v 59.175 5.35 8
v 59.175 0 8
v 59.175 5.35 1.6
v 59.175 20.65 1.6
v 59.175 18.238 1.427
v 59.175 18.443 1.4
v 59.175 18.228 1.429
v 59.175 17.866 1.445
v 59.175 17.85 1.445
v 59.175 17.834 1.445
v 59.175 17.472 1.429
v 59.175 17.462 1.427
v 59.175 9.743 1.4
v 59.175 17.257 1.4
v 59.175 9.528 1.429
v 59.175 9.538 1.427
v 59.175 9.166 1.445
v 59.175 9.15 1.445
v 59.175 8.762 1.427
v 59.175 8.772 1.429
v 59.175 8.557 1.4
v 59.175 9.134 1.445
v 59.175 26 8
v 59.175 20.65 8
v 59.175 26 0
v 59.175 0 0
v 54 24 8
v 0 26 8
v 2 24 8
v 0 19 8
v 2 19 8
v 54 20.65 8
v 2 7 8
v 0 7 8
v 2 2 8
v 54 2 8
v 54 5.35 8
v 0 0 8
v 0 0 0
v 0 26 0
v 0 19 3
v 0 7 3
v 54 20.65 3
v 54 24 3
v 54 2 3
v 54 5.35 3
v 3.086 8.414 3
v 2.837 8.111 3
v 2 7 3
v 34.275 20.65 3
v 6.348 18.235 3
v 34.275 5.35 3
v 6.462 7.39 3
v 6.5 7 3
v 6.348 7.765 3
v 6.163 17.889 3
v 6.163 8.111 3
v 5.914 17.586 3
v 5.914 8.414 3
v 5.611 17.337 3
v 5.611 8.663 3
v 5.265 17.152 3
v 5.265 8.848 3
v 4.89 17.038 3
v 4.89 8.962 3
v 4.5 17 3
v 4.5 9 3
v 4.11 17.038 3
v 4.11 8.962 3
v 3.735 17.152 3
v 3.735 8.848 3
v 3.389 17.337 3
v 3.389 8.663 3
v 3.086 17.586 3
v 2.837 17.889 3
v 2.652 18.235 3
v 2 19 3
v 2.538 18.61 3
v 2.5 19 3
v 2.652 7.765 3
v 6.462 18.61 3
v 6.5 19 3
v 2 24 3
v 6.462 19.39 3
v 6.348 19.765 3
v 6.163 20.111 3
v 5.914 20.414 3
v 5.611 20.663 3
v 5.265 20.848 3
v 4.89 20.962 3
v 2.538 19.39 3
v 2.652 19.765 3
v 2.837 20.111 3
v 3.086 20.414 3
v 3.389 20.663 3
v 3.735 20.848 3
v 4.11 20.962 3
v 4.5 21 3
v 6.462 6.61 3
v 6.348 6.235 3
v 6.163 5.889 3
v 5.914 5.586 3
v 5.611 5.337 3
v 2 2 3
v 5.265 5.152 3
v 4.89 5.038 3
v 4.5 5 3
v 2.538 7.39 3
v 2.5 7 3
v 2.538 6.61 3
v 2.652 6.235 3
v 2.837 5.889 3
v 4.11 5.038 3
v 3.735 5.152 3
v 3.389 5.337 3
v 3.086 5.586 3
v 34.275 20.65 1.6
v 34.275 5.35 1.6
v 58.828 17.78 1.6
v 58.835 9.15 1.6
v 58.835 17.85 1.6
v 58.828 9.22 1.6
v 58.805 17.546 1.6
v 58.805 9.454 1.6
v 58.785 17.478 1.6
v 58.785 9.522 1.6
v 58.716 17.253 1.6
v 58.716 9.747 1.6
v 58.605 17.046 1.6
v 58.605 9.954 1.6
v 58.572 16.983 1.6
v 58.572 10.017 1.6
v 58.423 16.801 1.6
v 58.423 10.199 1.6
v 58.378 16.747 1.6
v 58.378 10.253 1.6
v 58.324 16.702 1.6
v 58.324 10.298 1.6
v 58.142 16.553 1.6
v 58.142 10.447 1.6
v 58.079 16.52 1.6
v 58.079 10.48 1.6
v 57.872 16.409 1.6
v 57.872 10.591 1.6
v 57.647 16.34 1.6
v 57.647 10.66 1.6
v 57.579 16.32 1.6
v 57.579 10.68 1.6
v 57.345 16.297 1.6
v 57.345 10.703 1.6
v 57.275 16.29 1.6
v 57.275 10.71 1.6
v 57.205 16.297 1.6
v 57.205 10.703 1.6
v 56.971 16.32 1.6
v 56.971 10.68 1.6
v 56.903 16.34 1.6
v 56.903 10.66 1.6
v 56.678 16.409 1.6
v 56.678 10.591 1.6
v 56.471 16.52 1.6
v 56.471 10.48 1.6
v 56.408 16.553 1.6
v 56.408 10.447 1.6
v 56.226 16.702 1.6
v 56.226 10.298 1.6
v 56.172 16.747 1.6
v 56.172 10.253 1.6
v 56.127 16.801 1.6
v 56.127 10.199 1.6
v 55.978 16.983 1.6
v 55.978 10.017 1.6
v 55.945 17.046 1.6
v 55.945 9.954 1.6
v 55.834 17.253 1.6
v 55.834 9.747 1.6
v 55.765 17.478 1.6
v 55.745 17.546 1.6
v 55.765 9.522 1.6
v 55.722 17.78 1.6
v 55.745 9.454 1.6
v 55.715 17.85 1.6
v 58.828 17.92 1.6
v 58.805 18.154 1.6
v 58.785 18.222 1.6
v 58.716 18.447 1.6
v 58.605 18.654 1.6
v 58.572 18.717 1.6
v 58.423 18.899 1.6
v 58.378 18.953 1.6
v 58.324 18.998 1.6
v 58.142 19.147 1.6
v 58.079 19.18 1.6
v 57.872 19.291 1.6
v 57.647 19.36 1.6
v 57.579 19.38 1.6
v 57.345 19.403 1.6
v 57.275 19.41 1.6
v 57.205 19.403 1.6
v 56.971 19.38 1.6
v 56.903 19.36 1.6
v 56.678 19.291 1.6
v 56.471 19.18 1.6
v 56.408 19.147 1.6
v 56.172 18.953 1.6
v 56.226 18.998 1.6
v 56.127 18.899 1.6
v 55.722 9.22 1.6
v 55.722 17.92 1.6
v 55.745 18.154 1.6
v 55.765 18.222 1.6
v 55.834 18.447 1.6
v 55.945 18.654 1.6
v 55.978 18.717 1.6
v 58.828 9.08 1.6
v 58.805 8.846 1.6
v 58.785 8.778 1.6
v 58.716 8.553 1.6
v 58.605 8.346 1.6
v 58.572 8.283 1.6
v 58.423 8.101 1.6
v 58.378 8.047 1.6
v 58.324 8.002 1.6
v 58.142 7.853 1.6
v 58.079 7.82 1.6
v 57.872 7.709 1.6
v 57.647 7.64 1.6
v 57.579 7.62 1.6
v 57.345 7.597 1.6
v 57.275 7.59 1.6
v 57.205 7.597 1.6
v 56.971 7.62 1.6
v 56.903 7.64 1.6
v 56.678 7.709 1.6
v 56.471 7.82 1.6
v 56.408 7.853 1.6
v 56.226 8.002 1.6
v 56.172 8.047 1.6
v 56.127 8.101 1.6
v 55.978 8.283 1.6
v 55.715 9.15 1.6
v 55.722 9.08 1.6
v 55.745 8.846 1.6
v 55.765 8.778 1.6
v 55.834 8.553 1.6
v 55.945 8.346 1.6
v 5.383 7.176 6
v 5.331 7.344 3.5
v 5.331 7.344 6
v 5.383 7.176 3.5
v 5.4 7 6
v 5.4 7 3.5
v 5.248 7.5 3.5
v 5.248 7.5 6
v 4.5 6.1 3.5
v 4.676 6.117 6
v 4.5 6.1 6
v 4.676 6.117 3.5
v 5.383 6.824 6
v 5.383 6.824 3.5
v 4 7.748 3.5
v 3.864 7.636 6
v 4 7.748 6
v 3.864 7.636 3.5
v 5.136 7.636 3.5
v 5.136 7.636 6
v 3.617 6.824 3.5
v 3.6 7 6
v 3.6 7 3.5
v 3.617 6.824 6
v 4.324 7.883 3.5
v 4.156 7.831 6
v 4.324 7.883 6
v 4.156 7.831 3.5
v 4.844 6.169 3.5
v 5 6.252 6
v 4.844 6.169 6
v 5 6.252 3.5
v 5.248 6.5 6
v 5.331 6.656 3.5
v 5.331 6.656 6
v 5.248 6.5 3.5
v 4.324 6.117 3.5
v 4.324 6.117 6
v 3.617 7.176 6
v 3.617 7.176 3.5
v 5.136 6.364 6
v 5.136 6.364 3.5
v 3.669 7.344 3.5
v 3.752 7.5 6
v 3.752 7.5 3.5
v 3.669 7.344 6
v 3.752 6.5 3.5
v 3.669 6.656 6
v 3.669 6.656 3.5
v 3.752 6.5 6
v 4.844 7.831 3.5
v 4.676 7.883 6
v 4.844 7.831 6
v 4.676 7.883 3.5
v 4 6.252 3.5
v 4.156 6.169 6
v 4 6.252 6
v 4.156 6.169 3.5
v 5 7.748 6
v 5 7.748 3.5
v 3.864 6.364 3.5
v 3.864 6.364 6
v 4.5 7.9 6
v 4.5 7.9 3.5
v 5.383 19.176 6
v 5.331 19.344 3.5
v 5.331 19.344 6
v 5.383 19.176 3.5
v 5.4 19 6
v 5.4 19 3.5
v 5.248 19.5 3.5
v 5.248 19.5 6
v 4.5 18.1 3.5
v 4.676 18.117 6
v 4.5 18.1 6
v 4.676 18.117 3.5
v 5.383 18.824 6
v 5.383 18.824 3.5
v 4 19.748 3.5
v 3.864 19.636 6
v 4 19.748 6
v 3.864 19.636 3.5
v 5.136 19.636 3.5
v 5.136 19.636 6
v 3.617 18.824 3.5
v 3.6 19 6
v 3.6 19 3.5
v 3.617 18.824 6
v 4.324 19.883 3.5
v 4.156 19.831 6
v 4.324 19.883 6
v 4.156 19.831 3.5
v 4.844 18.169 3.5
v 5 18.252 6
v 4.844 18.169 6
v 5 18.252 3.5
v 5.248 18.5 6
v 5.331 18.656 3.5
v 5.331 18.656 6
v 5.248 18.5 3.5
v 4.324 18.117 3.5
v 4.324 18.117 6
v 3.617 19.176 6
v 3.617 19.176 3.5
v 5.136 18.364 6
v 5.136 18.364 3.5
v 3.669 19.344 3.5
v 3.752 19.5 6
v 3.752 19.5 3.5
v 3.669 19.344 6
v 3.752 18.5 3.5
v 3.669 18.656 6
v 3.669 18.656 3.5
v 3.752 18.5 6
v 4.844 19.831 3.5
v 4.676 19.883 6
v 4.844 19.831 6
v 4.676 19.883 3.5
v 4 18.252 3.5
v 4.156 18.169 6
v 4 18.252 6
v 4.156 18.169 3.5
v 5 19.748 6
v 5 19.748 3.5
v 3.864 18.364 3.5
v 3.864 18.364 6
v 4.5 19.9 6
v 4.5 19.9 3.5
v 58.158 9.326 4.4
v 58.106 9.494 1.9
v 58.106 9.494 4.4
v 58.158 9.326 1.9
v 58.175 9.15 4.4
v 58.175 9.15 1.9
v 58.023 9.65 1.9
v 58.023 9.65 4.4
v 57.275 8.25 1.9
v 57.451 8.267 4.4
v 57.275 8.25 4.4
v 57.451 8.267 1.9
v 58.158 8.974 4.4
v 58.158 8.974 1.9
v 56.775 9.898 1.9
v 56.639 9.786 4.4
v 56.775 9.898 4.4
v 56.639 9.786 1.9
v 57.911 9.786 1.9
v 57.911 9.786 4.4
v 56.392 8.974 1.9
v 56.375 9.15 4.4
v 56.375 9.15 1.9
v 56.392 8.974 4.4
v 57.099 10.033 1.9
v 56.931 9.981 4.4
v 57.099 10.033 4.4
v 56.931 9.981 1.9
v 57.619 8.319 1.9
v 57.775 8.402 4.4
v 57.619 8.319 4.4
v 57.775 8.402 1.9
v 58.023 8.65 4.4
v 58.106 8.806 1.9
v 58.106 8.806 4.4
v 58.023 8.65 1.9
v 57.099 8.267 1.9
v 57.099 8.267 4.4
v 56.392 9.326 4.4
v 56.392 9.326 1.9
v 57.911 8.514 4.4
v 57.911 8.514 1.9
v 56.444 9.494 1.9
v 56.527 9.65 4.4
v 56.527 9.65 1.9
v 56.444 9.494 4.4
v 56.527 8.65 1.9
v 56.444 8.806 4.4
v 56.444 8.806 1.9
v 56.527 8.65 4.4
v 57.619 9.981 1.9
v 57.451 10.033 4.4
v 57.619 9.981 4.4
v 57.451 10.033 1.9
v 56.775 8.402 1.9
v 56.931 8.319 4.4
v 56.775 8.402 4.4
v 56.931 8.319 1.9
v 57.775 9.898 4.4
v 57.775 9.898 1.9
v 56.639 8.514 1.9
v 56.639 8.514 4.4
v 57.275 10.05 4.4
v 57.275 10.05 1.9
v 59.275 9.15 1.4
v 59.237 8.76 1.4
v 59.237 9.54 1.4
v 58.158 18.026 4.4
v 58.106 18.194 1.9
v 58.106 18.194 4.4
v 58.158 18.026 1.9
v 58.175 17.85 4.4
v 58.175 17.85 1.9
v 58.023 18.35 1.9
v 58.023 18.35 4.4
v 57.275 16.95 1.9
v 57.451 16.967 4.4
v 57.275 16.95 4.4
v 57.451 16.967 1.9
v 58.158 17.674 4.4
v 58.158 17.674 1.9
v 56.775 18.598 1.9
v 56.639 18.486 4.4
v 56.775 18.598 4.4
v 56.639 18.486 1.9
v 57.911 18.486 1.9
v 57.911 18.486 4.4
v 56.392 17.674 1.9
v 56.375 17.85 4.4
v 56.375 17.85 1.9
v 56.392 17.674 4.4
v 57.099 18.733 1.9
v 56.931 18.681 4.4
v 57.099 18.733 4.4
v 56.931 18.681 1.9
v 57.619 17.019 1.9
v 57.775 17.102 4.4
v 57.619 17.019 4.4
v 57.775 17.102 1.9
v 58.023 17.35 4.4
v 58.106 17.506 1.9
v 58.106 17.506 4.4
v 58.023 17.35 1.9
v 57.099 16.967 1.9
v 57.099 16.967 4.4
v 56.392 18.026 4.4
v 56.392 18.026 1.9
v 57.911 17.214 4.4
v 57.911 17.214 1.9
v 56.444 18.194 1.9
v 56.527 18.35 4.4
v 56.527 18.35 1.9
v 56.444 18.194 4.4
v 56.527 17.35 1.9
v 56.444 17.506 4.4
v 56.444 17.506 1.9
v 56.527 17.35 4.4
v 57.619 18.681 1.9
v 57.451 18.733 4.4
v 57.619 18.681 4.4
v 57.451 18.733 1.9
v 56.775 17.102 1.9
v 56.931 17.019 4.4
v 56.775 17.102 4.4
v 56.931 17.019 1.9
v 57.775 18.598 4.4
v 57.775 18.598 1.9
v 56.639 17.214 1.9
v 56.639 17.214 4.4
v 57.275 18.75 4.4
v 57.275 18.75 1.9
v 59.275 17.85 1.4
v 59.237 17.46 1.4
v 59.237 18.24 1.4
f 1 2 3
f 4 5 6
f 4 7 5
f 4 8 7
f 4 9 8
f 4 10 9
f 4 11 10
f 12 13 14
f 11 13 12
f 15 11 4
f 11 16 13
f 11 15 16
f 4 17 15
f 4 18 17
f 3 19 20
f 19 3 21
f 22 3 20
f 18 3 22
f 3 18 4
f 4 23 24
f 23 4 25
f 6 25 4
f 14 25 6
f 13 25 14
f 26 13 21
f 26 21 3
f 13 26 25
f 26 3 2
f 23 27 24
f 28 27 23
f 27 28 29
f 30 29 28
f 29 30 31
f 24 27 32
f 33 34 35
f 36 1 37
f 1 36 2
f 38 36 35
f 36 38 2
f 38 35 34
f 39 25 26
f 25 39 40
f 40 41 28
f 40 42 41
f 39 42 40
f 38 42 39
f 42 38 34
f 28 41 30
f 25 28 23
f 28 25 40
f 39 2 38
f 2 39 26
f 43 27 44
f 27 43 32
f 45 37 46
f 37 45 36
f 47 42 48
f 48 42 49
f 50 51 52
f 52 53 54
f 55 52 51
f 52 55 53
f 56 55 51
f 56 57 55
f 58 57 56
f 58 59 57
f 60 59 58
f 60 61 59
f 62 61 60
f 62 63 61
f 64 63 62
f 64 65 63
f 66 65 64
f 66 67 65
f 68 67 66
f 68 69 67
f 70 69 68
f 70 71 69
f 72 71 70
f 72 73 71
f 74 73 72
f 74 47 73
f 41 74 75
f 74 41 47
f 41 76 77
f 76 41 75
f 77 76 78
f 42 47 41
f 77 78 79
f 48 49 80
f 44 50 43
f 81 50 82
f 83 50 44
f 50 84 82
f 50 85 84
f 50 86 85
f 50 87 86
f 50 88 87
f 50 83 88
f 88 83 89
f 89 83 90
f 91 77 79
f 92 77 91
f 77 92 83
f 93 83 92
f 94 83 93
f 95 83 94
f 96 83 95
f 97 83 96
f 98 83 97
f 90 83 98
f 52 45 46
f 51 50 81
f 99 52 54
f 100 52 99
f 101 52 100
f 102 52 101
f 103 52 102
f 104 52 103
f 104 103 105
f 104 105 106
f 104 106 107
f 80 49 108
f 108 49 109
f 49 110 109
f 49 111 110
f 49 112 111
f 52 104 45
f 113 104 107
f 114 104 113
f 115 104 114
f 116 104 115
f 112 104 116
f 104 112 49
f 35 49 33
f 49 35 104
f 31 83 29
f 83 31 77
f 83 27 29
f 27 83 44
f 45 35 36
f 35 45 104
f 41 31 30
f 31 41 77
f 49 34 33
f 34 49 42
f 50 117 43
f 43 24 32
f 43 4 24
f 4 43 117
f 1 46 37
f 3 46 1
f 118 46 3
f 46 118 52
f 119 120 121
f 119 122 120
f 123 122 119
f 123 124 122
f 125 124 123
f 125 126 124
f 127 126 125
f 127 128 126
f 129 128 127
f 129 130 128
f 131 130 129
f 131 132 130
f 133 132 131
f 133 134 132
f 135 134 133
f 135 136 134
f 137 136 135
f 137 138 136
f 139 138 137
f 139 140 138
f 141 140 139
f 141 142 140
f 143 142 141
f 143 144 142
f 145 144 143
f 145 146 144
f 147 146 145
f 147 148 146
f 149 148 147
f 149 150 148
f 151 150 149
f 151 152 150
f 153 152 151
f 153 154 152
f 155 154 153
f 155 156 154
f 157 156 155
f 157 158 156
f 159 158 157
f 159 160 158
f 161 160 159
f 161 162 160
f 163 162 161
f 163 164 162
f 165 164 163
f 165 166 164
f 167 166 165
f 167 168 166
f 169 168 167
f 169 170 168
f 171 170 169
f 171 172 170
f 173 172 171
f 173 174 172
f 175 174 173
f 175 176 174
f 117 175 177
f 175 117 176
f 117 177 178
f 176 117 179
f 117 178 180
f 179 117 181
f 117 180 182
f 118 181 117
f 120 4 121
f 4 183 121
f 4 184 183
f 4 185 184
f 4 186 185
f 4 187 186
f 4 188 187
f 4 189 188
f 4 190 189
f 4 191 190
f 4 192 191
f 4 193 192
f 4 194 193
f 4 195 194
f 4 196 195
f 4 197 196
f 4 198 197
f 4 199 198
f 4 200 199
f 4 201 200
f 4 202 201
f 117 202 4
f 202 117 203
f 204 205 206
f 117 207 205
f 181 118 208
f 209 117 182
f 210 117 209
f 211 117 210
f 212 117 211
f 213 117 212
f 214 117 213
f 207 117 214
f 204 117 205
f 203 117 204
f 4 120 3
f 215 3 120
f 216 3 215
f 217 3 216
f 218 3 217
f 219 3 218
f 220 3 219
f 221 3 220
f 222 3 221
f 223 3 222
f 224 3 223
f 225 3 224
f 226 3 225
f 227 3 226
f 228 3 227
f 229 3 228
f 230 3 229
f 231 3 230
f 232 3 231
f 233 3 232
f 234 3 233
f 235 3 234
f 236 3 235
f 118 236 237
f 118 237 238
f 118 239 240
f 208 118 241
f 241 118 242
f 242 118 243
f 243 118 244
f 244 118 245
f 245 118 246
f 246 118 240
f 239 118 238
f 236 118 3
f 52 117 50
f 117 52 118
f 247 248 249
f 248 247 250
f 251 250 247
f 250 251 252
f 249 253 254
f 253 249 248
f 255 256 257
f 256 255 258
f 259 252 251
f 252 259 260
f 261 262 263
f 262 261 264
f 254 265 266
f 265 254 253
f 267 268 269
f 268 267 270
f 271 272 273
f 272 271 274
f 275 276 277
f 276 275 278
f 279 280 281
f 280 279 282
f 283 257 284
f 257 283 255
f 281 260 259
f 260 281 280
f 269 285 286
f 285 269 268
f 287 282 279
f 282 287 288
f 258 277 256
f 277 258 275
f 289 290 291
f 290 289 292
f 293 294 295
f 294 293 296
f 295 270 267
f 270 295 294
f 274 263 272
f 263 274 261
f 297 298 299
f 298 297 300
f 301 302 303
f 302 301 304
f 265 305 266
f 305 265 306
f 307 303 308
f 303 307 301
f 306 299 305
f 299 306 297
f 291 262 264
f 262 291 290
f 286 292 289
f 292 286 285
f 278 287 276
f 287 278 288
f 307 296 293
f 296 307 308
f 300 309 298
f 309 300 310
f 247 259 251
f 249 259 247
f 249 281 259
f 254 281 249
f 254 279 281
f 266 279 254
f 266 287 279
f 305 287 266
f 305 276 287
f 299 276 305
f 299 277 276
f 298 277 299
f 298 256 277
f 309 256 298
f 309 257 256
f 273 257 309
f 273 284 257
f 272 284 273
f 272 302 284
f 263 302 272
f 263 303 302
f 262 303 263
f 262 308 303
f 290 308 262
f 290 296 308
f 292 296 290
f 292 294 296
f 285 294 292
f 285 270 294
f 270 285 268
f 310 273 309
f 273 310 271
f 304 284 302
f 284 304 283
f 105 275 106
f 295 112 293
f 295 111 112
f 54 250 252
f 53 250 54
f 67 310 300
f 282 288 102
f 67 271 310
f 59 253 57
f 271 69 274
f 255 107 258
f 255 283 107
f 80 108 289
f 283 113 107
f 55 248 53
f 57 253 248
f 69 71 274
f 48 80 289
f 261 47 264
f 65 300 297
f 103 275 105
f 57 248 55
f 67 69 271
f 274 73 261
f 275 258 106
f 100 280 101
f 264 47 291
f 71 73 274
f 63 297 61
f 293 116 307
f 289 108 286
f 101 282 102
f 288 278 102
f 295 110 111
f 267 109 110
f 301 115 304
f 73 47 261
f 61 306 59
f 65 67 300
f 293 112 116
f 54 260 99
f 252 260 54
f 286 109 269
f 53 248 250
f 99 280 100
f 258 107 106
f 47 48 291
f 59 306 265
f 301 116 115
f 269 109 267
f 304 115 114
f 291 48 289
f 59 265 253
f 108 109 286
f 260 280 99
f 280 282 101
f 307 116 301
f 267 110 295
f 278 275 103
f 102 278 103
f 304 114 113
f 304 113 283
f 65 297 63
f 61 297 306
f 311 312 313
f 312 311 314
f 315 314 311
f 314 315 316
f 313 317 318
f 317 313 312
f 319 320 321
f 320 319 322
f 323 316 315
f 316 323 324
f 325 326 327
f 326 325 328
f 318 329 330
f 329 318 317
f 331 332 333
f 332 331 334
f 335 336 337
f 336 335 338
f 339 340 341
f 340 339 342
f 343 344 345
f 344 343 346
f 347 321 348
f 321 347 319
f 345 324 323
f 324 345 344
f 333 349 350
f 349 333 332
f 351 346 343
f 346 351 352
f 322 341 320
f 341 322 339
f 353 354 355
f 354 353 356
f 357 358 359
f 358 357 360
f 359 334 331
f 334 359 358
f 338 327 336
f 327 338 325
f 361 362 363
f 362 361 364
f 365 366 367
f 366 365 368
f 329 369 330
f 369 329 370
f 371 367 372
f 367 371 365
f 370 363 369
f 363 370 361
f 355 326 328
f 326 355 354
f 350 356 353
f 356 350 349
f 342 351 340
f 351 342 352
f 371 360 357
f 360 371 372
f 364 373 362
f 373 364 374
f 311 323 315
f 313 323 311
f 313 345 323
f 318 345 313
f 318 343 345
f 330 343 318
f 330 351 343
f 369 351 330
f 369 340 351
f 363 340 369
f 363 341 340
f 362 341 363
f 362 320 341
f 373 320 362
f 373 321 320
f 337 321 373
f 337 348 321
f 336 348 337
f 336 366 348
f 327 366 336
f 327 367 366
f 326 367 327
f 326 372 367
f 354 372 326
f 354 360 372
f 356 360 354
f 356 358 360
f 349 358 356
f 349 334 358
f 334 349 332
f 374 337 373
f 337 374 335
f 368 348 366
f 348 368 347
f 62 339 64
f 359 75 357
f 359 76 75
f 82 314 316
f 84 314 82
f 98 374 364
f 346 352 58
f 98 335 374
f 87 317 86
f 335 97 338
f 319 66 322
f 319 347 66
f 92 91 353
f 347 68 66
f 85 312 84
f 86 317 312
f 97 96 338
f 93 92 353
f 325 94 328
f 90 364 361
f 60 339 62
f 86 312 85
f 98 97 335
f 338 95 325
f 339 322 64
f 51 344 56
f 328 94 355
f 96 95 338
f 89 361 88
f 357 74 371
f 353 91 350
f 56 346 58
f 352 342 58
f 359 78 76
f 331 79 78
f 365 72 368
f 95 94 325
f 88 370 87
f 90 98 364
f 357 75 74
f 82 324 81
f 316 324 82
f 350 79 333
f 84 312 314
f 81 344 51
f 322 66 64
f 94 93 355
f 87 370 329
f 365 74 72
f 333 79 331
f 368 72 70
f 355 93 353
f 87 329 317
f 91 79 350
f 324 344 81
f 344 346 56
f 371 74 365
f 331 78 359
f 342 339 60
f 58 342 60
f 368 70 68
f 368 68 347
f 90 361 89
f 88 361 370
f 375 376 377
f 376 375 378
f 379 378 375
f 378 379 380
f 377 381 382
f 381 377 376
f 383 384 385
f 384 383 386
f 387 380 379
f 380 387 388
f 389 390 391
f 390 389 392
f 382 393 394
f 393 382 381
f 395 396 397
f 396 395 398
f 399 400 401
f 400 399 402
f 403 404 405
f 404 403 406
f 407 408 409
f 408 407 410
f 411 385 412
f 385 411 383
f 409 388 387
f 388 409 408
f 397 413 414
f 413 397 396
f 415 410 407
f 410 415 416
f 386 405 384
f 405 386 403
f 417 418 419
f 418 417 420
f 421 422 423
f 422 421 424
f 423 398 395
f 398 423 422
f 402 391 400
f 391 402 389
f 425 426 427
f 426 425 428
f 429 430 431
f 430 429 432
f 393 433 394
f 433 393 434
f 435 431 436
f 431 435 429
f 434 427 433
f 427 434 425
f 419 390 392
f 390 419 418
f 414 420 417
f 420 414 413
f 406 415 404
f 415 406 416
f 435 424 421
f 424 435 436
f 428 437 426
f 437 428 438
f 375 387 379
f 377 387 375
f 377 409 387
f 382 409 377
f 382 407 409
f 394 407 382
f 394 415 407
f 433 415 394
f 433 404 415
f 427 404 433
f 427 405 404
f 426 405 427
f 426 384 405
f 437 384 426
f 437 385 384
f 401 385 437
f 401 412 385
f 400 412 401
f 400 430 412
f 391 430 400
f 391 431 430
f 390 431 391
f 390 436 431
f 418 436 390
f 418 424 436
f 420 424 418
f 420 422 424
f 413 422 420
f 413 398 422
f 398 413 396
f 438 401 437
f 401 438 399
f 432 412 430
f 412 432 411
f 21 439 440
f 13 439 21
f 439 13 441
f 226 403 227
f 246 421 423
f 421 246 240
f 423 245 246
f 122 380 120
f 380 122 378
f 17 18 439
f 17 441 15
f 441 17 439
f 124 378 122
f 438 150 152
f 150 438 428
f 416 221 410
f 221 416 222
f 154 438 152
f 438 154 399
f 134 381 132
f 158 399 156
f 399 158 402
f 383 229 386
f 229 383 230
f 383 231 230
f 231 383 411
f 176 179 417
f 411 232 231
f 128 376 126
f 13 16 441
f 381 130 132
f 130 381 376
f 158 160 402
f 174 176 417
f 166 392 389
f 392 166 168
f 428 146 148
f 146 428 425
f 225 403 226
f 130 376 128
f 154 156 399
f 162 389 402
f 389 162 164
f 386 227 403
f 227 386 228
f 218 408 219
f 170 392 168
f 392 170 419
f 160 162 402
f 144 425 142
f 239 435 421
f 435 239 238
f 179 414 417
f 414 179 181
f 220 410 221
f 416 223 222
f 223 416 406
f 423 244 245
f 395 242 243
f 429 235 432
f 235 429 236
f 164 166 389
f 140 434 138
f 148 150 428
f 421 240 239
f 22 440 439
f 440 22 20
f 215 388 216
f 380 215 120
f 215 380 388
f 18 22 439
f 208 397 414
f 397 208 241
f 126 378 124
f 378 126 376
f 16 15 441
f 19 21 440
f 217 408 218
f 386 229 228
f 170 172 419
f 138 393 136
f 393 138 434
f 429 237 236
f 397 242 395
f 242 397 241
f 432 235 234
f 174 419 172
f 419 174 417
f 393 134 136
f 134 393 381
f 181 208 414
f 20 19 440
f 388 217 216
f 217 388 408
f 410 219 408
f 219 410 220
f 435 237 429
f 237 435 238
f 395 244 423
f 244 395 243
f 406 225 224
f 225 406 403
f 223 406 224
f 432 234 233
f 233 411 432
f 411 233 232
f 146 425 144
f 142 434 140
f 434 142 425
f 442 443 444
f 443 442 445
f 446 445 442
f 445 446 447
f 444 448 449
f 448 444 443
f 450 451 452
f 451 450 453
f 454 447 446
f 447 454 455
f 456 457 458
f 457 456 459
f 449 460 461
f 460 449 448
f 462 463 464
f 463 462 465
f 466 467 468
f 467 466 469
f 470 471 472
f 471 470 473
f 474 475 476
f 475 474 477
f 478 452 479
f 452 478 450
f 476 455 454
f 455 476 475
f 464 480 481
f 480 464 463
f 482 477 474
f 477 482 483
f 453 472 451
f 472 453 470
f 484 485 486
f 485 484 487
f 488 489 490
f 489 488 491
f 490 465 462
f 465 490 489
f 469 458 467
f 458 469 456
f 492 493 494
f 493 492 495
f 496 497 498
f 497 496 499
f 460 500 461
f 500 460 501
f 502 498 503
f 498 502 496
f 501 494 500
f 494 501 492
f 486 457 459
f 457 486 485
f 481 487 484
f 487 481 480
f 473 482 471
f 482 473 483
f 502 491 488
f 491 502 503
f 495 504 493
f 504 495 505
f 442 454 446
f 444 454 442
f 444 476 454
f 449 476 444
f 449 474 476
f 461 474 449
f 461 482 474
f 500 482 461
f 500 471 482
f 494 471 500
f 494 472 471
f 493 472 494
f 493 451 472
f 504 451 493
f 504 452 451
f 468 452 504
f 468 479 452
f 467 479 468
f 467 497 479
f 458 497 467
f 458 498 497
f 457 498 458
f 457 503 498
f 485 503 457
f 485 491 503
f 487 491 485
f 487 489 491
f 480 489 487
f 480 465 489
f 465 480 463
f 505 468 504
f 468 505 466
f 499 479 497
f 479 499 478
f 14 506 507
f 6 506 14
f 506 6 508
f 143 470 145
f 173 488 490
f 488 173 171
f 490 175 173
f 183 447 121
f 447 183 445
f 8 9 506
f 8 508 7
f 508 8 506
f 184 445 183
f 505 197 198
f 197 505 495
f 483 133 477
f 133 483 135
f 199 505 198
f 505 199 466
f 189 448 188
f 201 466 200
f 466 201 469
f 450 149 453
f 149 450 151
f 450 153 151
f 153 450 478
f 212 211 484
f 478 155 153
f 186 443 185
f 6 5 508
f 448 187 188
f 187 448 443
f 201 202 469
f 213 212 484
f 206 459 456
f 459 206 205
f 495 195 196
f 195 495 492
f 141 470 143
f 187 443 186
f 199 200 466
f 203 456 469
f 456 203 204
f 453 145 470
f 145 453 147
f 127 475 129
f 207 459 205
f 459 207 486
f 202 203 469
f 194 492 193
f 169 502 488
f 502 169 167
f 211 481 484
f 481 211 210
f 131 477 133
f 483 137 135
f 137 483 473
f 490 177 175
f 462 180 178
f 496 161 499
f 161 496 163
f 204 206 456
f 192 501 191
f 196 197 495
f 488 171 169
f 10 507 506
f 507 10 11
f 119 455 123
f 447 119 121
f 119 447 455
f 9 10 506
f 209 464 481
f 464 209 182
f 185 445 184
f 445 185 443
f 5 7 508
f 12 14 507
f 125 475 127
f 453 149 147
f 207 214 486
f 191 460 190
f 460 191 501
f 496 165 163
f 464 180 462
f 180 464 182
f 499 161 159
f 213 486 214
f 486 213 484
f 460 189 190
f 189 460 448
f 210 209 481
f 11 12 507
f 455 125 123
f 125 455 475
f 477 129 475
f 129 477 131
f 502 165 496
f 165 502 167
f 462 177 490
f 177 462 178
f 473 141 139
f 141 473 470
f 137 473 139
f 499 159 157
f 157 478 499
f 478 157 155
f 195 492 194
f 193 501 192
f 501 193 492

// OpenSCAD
// Pico W Enclosure with Mounting Posts
// All dimensions in millimeters

// Pico W dimensions
pico_length = 51;  // Actual Pico W is 51mm
pico_width = 21;
pico_thickness = 1;  // PCB thickness

// Mounting hole positions (relative to board corner)
// Pico W has 2 mounting holes at opposite corners
pico_hole_offset_chg = 2;  // Distance from edge to hole center
pico_hole_offset_w = 4.5;  // Distance from edge to hole center
pico_hole_diameter = 2.1;  // Mounting hole diameter on the Pico

// Enclosure parameters
wall_thickness = 2;
base_thickness = 3;
enclosure_height = 5;  // Internal height as requested
clearance = 0.5;  // Extra space around Pico for easy fitting

// Post parameters
post_diameter = 1.8;  // Smaller diameter to fit THROUGH the Pico's holes
post_height = 3;  // Height of posts from base (should be taller than PCB thickness)

// adafruit sensor dimensions (MEASURED WITH TAPE MEASURE, PROBABLY A BIT OFF)
ada_hole_diameter = 3.1;
ada_hole_offset_w = 2.8;
ada_hole_offset_l_chg = 23;
ada_hole_offset_l_sens = 3.175;
ada_length_enclosed = 25.4;
ada_length = 101.6;
ada_height = 1.6;
ada_width = 14.3;

// Calculate enclosure dimensions
enclosure_length = pico_length + ada_hole_offset_l_sens + (2 * clearance) + (2 * wall_thickness);
enclosure_width = pico_width + (2 * clearance) + (2 * wall_thickness);
enclosure_total_height = base_thickness + enclosure_height;

// Main enclosure module
module enclosure() {
    difference() {
        // Outer box
        cube([enclosure_length, enclosure_width, enclosure_total_height]);
        
        // Inner cavity
        translate([wall_thickness, wall_thickness, base_thickness])
            cube([pico_length + (2 * clearance), 
                  pico_width + (2 * clearance), 
                  enclosure_height + 1]);
        
        // Cable opening (for USB port)
        translate([-1, enclosure_width/2 - 6, base_thickness])
            cube([wall_thickness + 2, 12, 6]);

        // Sensor back end opening
        translate([pico_length + wall_thickness, (enclosure_width/2) - (ada_width/2) - clearance, base_thickness])
            cube([wall_thickness + ada_hole_offset_l_sens + wall_thickness, ada_width + clearance*2, enclosure_height + 1]);

        // Sensor cavity
        translate([enclosure_length - ada_length_enclosed + clearance, enclosure_width/2 - ada_width/2 - clearance, (base_thickness - ada_height) + 0.2])
            cube([ada_length_enclosed + 1, ada_width + clearance*2, ada_height + 0.5]);
    }
}

module mounting_post(height, diameter) {
    cylinder(h = post_height, d = post_diameter, $fn = 32);
}

// Optional: Support base for posts (makes them stronger)
module post_support(diameter) {
    cylinder(h = 0.5, d1 = 4, d2 = post_diameter, $fn = 32);
}

// Main assembly
union() {
    // Base enclosure
    enclosure();
    
    // Mounting posts positioned at Pico W mounting holes
    // Position calculations include wall thickness and clearance
    
    // pico left post
    translate([wall_thickness + clearance + pico_hole_offset_chg, 
               wall_thickness + clearance + pico_hole_offset_w, 
               base_thickness])
        union() {
            mounting_post(post_height, post_diameter);
            post_support(post_diameter);
        }
    
    // pico right post
    translate([wall_thickness + clearance + pico_hole_offset_chg, 
               wall_thickness + clearance + pico_width - pico_hole_offset_w, 
               base_thickness])
        union() {
            mounting_post(post_height, post_diameter);
            post_support(post_diameter);
        }

    translate([enclosure_length - ada_length_enclosed + ada_hole_offset_l_chg + clearance,
                enclosure_width/2 - ada_width/2 + ada_hole_offset_w + clearance,
                base_thickness - ada_height])
        union() {
            mounting_post(post_height, ada_hole_diameter - 0.2);
            post_support(ada_hole_diameter - 0.2);
        }
    translate([enclosure_length - ada_length_enclosed + ada_hole_offset_l_chg + clearance,
                enclosure_width/2 + ada_width/2 + clearance - ada_hole_offset_w,
                base_thickness - ada_height])
        union() {
            mounting_post(post_height, ada_hole_diameter - 0.2);
            post_support(ada_hole_diameter - 0.2);
        }
}

// Optional: Show Pico W outline for reference (comment out for printing)
// %translate([wall_thickness + clearance, wall_thickness + clearance, base_thickness + 1])
//     cube([pico_length, pico_width, pico_thickness]);
